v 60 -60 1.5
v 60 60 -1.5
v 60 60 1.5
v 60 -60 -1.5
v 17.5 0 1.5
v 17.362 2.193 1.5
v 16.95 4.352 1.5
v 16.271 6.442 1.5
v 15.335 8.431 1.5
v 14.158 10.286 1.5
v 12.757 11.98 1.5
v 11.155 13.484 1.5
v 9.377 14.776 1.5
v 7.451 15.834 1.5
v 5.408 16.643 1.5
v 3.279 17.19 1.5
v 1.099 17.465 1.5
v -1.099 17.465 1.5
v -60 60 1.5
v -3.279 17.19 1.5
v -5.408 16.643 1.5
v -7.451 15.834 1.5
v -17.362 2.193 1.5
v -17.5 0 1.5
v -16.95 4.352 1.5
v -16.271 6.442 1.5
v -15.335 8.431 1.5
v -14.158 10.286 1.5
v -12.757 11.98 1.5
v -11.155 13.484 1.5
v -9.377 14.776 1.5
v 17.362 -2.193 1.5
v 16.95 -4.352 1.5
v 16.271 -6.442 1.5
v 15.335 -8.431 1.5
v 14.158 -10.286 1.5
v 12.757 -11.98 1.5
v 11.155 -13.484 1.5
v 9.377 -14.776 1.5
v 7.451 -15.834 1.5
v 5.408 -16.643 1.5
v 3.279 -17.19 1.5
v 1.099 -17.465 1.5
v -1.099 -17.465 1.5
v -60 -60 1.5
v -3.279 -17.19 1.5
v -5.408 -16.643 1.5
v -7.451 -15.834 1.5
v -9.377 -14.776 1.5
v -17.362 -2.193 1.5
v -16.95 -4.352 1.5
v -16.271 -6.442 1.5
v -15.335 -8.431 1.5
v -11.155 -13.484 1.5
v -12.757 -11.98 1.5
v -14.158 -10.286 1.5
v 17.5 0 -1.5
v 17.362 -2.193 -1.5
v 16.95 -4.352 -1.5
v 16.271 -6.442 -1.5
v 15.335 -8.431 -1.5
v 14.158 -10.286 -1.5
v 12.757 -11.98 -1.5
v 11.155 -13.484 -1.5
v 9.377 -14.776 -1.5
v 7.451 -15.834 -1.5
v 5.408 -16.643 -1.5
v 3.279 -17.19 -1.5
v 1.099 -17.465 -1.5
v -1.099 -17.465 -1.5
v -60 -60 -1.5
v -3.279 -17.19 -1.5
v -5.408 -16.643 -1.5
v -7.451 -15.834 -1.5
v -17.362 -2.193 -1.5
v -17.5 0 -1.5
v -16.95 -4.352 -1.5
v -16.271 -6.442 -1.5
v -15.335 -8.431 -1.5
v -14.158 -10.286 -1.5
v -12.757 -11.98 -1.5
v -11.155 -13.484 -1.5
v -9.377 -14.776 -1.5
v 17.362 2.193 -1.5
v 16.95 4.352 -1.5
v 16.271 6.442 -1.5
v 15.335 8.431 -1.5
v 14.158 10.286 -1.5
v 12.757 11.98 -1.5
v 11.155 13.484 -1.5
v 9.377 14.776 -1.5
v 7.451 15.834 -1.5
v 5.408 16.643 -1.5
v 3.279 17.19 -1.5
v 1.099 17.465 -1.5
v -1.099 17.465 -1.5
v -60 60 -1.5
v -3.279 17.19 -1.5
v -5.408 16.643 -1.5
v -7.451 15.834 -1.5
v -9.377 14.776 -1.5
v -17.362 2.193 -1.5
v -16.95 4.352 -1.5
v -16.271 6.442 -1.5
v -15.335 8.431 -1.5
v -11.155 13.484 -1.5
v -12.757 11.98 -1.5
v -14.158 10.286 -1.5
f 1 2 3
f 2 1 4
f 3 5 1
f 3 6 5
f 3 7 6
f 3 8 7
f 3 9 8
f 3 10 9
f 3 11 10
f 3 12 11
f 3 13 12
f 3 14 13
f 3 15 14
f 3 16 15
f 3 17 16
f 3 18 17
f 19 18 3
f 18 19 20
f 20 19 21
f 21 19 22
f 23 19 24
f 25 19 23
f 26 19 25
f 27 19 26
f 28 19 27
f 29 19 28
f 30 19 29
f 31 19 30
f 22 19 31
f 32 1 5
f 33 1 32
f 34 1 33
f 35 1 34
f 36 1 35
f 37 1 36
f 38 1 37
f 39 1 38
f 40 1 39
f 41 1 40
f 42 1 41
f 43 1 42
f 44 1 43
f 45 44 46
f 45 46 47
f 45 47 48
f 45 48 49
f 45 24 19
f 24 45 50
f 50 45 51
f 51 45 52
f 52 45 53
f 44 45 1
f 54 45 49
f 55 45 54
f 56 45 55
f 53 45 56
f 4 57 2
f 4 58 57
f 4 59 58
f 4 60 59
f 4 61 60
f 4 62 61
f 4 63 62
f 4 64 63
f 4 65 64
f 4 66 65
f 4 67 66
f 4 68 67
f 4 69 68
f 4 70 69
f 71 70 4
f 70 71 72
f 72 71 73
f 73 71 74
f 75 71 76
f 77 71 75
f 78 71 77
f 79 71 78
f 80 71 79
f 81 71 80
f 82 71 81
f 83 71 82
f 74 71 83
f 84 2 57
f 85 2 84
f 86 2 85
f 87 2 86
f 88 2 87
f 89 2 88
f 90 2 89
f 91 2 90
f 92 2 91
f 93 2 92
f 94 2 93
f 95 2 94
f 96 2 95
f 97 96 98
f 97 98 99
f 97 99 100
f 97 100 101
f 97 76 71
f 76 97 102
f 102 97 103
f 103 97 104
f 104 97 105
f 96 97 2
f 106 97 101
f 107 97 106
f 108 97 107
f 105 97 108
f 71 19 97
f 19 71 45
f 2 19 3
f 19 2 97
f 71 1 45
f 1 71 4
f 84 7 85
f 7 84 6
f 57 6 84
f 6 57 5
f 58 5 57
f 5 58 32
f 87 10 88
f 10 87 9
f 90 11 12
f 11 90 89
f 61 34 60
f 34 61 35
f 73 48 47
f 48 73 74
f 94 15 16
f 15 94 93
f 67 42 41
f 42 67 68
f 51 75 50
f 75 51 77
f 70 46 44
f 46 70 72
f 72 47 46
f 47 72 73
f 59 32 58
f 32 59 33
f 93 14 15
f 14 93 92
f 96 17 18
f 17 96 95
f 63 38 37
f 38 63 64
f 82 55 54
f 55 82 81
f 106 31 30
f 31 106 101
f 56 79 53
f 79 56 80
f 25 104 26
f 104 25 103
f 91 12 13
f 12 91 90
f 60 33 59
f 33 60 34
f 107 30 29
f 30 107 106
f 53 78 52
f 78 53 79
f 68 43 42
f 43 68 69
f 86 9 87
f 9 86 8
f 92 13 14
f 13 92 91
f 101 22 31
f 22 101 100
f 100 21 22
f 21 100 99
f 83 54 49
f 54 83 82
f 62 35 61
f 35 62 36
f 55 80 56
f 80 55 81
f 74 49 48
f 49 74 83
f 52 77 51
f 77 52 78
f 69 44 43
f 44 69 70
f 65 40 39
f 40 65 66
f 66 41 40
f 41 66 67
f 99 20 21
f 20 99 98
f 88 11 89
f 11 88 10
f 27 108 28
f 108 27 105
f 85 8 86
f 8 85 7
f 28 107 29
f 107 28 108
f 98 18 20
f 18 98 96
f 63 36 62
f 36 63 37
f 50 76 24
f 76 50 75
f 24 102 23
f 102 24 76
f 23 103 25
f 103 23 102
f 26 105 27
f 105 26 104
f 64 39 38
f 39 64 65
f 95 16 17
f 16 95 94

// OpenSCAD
// file: pins.scad
// Pin Connectors V2
// Tony Buser <tbuser@gmail.com>

// pinhole(h=5);

// test();
// pintack(h=10);
// pinpeg(h=20);

module test() {
  tolerance = 0.3;
  
  translate([-12, 12, 0]) pinpeg(h=20);
  translate([12, 12, 0]) pintack(h=10);
  
  difference() {
    union() {
      translate([0, -12, 2.5]) cube(size = [59, 20, 5], center = true);
      translate([24, -12, 7.5]) cube(size = [12, 20, 15], center = true);
    }
    translate([-24, -12, 0]) pinhole(h=5, t=tolerance);
    translate([-12, -12, 0]) pinhole(h=5, t=tolerance, tight=false);
    translate([0, -12, 0]) pinhole(h=10, t=tolerance);
    translate([12, -12, 0]) pinhole(h=10, t=tolerance, tight=false);
    translate([24, -12, 15]) rotate([0, 180, 0]) pinhole(h=10, t=tolerance);
  }
}

module pinhole(h=10, r=4, lh=3, lt=1, t=0.3, tight=true) {
  // h = shaft height
  // r = shaft radius
  // lh = lip height
  // lt = lip thickness
  // t = tolerance
  // tight = set to false if you want a joint that spins easily
  
  union() {
    pin_solid(h, r+(t/2), lh, lt);
    cylinder(h=h+0.2, r=r, $fn=50);
    // widen the cylinder slightly
    // cylinder(h=h+0.2, r=r+(t-0.2/2));
    if (tight == false) {
      cylinder(h=h+0.2, r=r+(t/2)+0.25, $fn=50);
    }
    // widen the entrance hole to make insertion easier
    translate([0, 0, -0.1]) cylinder(h=lh/3, r2=r, r1=r+(t/2)+(lt/2), $fn=50);
  }
}

module pin(h=10, r=4, lh=3, lt=1, side=false) {
  // h = shaft height
  // r = shaft radius
  // lh = lip height
  // lt = lip thickness
  // side = set to true if you want it printed horizontally

  if (side) {
    pin_horizontal(h, r, lh, lt);
  } else {
    pin_vertical(h, r, lh, lt);
  }
}

module pintack(h=10, r=4, lh=3, lt=1, bh=3, br=8.75) {
  // bh = base_height
  // br = base_radius
  
  union() {
    cylinder(h=bh, r=br);
    translate([0, 0, bh]) pin(h, r, lh, lt);
  }
}

module pinpeg(h=20, r=4, lh=3, lt=1) {
  union() {
    translate([0, -h/4+0.05, 0]) pin(h/2+0.1, r, lh, lt, side=true);
    translate([0, h/4-0.05, 0]) rotate([0, 0, 180]) pin(h/2+0.1, r, lh, lt, side=true);
  }
}

// just call pin instead, I made this module because it was easier to do the rotation option this way
// since openscad complains of recursion if I did it all in one module
module pin_vertical(h=10, r=4, lh=3, lt=1) {
  // h = shaft height
  // r = shaft radius
  // lh = lip height
  // lt = lip thickness

  difference() {
    pin_solid(h, r, lh, lt);
    
    // center cut
    translate([-r*0.5/2, -(r*2+lt*2)/2, h/4]) cube([r*0.5, r*2+lt*2, h]);
    translate([0, 0, h/4]) cylinder(h=h+lh, r=r/2.5, $fn=50);
    // center curve
    // translate([0, 0, h/4]) rotate([90, 0, 0]) cylinder(h=r*2, r=r*0.5/2, center=true, $fn=20);
  
    // side cuts
    translate([-r*2, -lt-r*1.125, -1]) cube([r*4, lt*2, h+2]);
    translate([-r*2, -lt+r*1.125, -1]) cube([r*4, lt*2, h+2]);
  }
}

// call pin with side=true instead of this
module pin_horizontal(h=10, r=4, lh=3, lt=1) {
  // h = shaft height
  // r = shaft radius
  // lh = lip height
  // lt = lip thickness
  translate([0, h/2, r*1.125-lt]) rotate([90, 0, 0]) pin_vertical(h, r, lh, lt);
}

// this is mainly to make the pinhole module easier
module pin_solid(h=10, r=4, lh=3, lt=1) {
  union() {
    // shaft
    cylinder(h=h-lh, r=r, $fn=50);
    // lip
    // translate([0, 0, h-lh]) cylinder(h=lh*0.25, r1=r, r2=r+(lt/2), $fn=30);
    // translate([0, 0, h-lh+lh*0.25]) cylinder(h=lh*0.25, r2=r, r1=r+(lt/2), $fn=30);
    // translate([0, 0, h-lh+lh*0.50]) cylinder(h=lh*0.50, r1=r, r2=r-(lt/2), $fn=30);

    // translate([0, 0, h-lh]) cylinder(h=lh*0.50, r1=r, r2=r+(lt/2), $fn=30);
    // translate([0, 0, h-lh+lh*0.50]) cylinder(h=lh*0.50, r1=r+(lt/2), r2=r-(lt/3), $fn=30);    

    translate([0, 0, h-lh]) cylinder(h=lh*0.25, r1=r, r2=r+(lt/2), $fn=50);
    translate([0, 0, h-lh+lh*0.25]) cylinder(h=lh*0.25, r=r+(lt/2), $fn=50);    
    translate([0, 0, h-lh+lh*0.50]) cylinder(h=lh*0.50, r1=r+(lt/2), r2=r-(lt/2), $fn=50);    

    // translate([0, 0, h-lh]) cylinder(h=lh, r1=r+(lt/2), r2=1, $fn=30);
    // translate([0, 0, h-lh-lt/2]) cylinder(h=lt/2, r1=r, r2=r+(lt/2), $fn=30);
  }
}
// main file
// lithobox
// Inspirations:
// - https://www.thingiverse.com/thing:3755803
// - https://lithophanemaker.com/Lithophane%20Light%20Box.html
// - https://itslitho.com

// https://github.com/tbuser/pin_connectors/blob/master/pins.scad
use <pins.scad>

// Adjustable constants

// Lithopane side size. (must be a square)
lithSize = 120; //[100:1:200]

// Lithopane Thickness
lithThickness = 3; //[0.8:.2:10]

// Lithopane Border size (determines inset depth)
lithBorderWidth = 2; //[1:.2:8]

// size of the lip between outer edge and lithophane panel
lipSize = 2; //[1.8:.2:10]

// Hole for lightbulb to fit into
backPanelHoleRadius = 17.5; //[1:.1:30]

// Text to put on back panel
showText = false;

line1 = "The";
line2 = "Quick";
line3 = "Brown";

line4 = "Fox";
line5 = "Jumped";
line6 = "Real High";

// Real constants

borderThickness = lipSize + lithThickness + lipSize + lithBorderWidth;
// borderThickness = 9

floorThickness = 5;

innerThickness = lipSize * 2 + lithThickness;
// innerThickness = 7

pillarHeight = lithSize - lithBorderWidth * 2;
pinCorner = lithSize / 2 + innerThickness / 2;
// pinCorner = 60 + 3.5

pinHeight = 5;
pinRadius = 2.3;

module
myPin()
{
    color("RoyalBlue") pin(h = pinHeight, r = pinRadius);
}

module
myPinHole()
{
    color("RoyalBlue") pinhole(h = pinHeight, r = pinRadius-.075, tight = false);
}

module
pillar()
{
    pillarPinCorner = pinCorner + innerThickness / 2 - borderThickness / 2;

    translate([ pillarPinCorner, pillarPinCorner, 0 ])
        cube([ borderThickness, borderThickness, pillarHeight ], true);
    translate([ pinCorner, pinCorner, pillarHeight / 2 -1.25]) myPin();
    translate([ pinCorner, pinCorner, -pillarHeight / 2 + 1.25])
        rotate([ 0, 180, 0 ]) myPin();
}

module
pillarWithPanels()
{
    difference()
    {
        translate([ 0, 0, -1 ]) pillar();
        panels(top = true);
    }
}

module
base()
{
    outerBaseSize = lithSize + innerThickness * 2;
    innerBaseSize = lithSize;

    difference()
    {
        translate([ -outerBaseSize / 2, -outerBaseSize / 2, 0 ])
            cube([ outerBaseSize, outerBaseSize, borderThickness ], false);
        translate(
            [ -innerBaseSize / 2, -innerBaseSize / 2, floorThickness + 0.1 ])
            cube([ lithSize, lithSize, borderThickness - floorThickness ],
                 false);
    }
}

module topBase(height)
{
    outerBaseSize = lithSize + innerThickness * 2;
    stiffUpperLip = lithSize - lipSize * 2;

    difference()
    {
        translate([ -outerBaseSize / 2, -outerBaseSize / 2, 0 ])
            cube([ outerBaseSize, outerBaseSize, height ], false);
        translate([ -stiffUpperLip / 2, -stiffUpperLip / 2, -1 ])
            cube([ stiffUpperLip, stiffUpperLip, height + floorThickness * 2 ],
                 false);
    }
}

module panels(bufferOn = true, top = false)
{
    buffer = bufferOn ? 0.4 : 0;
    height = top ? lithSize : lithThickness;
    x = lithSize / 2 + innerThickness / 2;
    z = top ? -lithBorderWidth
            : borderThickness + lithThickness / 2 - lithBorderWidth;

    translate([ 0, -x, z ]) rotate([ 90, 0, 0 ]) panel(height, buffer);
    translate([ 0, x, z ]) rotate([ 90, 0, 0 ]) panel(height, buffer);
    translate([ -x, 0, z ]) rotate([ 90, 0, 90 ]) panel(height, buffer);
    translate([ x, 0, z ]) rotate([ 90, 0, 90 ]) panel(height, buffer);
}

module panel(height, buffer)
{
    color("Plum")
        cube([ lithSize + buffer, height, lithThickness + buffer ], true);
}

module internalPanels(pw, ph, pd)
{
    translate([ 0, 0, pd / 2 ]) color("green")
        cube([ pw + 0.4, ph + 0.4, pd + 0.4 ], true);
}

module
top()
{
    height = borderThickness - lipSize;
    pinHoleDepth = height - pinHeight;

    difference()
    {
        topBase(height);

        translate([ pinCorner, pinCorner, pinHoleDepth ]) myPinHole();
        translate([ -pinCorner, pinCorner, pinHoleDepth ]) myPinHole();
        translate([ pinCorner, -pinCorner, pinHoleDepth ]) myPinHole();
        translate([ -pinCorner, -pinCorner, pinHoleDepth ]) myPinHole();

        panels(top = true);
        internalPanels(lithSize, lithSize, lithThickness + 0.4);
    };
}

module
bottom()
{
    pinHoleDepth = borderThickness - pinHeight;

    difference()
    {
        base();
        translate([ pinCorner, pinCorner, pinHoleDepth ]) myPinHole();
        translate([ -pinCorner, pinCorner, pinHoleDepth ]) myPinHole();
        translate([ pinCorner, -pinCorner, pinHoleDepth ]) myPinHole();
        translate([ -pinCorner, -pinCorner, pinHoleDepth ]) myPinHole();

        panels();
    };
}

module
backPanel()
{
    difference()
    {
        cube([ lithSize, lithSize, lithThickness ], true);
        cylinder(lithThickness * 2, r = backPanelHoleRadius, center = true, $fn=50);
        translate([ 0, 0, lithThickness / 2 - 0.4 ]) color("blue")
            linear_extrude(1) myText();
    }
}

module
myText()
{
    if (showText == true)
    {
        textOffset = (lithSize / 2 - backPanelHoleRadius) / 4;

        fontsize = 5;

        fontname = "Microsoft Sans Serif";
        translate([ 0, backPanelHoleRadius + textOffset * 3, 0 ])
            text(line1,
                size = fontsize,
                halign = "center",
                valign = "center",
                font = fontname);
        translate([ 0, backPanelHoleRadius + textOffset * 2, 0 ])
            text(line2,
                size = fontsize,
                halign = "center",
                valign = "center",
                font = fontname);
        translate([ 0, backPanelHoleRadius + textOffset, 0 ])
            text(line3,
                size = fontsize,
                halign = "center",
                valign = "center",
                font = fontname);

        translate([ 0, -backPanelHoleRadius - textOffset, 0 ])
            text(line4,
                size = fontsize,
                halign = "center",
                valign = "center",
                font = fontname);
        translate([ 0, -backPanelHoleRadius - textOffset * 2, 0 ])
            text(line5,
                size = fontsize,
                halign = "center",
                valign = "center",
                font = fontname);
        translate([ 0, -backPanelHoleRadius - textOffset * 3, 0 ])
            text(line6,
                size = fontsize,
                halign = "center",
                valign = "center",
                font = fontname);
        
    }
}

module
topCover()
{
    topBase(lipSize);
    translate([ 0, 0, -borderThickness + lithBorderWidth + lithThickness - 1 ])
        panels(bufferOn = false);
}

module
print_part()
{
    // bottom();
    // translate([ lithSize * 1.5, 0, borderThickness - lithThickness ])
    //     rotate([ 180, 0, 0 ]) top();
    // translate([ 0, lithSize * 1.5, pinCorner + innerThickness / 2 ])
    //     rotate([ 90, 180, 0 ]) pillarWithPanels();
    // translate([ lithSize * 1.5, lithSize * 1.5, 0 ]) backPanel();
    // translate([ borderThickness * 3, lithSize * 1.5, 0 ]) topCover();

    // bottom();
    // rotate([ 180, 0, 0 ]) top();
    // for (i=[0,1,2,3]) translate([borderThickness * 2 * i + borderThickness * 4, 0, pinCorner + innerThickness / 2]) rotate([ 90, 180, 0 ]) pillarWithPanels();
    backPanel();
    // topCover();
}

print_part();
